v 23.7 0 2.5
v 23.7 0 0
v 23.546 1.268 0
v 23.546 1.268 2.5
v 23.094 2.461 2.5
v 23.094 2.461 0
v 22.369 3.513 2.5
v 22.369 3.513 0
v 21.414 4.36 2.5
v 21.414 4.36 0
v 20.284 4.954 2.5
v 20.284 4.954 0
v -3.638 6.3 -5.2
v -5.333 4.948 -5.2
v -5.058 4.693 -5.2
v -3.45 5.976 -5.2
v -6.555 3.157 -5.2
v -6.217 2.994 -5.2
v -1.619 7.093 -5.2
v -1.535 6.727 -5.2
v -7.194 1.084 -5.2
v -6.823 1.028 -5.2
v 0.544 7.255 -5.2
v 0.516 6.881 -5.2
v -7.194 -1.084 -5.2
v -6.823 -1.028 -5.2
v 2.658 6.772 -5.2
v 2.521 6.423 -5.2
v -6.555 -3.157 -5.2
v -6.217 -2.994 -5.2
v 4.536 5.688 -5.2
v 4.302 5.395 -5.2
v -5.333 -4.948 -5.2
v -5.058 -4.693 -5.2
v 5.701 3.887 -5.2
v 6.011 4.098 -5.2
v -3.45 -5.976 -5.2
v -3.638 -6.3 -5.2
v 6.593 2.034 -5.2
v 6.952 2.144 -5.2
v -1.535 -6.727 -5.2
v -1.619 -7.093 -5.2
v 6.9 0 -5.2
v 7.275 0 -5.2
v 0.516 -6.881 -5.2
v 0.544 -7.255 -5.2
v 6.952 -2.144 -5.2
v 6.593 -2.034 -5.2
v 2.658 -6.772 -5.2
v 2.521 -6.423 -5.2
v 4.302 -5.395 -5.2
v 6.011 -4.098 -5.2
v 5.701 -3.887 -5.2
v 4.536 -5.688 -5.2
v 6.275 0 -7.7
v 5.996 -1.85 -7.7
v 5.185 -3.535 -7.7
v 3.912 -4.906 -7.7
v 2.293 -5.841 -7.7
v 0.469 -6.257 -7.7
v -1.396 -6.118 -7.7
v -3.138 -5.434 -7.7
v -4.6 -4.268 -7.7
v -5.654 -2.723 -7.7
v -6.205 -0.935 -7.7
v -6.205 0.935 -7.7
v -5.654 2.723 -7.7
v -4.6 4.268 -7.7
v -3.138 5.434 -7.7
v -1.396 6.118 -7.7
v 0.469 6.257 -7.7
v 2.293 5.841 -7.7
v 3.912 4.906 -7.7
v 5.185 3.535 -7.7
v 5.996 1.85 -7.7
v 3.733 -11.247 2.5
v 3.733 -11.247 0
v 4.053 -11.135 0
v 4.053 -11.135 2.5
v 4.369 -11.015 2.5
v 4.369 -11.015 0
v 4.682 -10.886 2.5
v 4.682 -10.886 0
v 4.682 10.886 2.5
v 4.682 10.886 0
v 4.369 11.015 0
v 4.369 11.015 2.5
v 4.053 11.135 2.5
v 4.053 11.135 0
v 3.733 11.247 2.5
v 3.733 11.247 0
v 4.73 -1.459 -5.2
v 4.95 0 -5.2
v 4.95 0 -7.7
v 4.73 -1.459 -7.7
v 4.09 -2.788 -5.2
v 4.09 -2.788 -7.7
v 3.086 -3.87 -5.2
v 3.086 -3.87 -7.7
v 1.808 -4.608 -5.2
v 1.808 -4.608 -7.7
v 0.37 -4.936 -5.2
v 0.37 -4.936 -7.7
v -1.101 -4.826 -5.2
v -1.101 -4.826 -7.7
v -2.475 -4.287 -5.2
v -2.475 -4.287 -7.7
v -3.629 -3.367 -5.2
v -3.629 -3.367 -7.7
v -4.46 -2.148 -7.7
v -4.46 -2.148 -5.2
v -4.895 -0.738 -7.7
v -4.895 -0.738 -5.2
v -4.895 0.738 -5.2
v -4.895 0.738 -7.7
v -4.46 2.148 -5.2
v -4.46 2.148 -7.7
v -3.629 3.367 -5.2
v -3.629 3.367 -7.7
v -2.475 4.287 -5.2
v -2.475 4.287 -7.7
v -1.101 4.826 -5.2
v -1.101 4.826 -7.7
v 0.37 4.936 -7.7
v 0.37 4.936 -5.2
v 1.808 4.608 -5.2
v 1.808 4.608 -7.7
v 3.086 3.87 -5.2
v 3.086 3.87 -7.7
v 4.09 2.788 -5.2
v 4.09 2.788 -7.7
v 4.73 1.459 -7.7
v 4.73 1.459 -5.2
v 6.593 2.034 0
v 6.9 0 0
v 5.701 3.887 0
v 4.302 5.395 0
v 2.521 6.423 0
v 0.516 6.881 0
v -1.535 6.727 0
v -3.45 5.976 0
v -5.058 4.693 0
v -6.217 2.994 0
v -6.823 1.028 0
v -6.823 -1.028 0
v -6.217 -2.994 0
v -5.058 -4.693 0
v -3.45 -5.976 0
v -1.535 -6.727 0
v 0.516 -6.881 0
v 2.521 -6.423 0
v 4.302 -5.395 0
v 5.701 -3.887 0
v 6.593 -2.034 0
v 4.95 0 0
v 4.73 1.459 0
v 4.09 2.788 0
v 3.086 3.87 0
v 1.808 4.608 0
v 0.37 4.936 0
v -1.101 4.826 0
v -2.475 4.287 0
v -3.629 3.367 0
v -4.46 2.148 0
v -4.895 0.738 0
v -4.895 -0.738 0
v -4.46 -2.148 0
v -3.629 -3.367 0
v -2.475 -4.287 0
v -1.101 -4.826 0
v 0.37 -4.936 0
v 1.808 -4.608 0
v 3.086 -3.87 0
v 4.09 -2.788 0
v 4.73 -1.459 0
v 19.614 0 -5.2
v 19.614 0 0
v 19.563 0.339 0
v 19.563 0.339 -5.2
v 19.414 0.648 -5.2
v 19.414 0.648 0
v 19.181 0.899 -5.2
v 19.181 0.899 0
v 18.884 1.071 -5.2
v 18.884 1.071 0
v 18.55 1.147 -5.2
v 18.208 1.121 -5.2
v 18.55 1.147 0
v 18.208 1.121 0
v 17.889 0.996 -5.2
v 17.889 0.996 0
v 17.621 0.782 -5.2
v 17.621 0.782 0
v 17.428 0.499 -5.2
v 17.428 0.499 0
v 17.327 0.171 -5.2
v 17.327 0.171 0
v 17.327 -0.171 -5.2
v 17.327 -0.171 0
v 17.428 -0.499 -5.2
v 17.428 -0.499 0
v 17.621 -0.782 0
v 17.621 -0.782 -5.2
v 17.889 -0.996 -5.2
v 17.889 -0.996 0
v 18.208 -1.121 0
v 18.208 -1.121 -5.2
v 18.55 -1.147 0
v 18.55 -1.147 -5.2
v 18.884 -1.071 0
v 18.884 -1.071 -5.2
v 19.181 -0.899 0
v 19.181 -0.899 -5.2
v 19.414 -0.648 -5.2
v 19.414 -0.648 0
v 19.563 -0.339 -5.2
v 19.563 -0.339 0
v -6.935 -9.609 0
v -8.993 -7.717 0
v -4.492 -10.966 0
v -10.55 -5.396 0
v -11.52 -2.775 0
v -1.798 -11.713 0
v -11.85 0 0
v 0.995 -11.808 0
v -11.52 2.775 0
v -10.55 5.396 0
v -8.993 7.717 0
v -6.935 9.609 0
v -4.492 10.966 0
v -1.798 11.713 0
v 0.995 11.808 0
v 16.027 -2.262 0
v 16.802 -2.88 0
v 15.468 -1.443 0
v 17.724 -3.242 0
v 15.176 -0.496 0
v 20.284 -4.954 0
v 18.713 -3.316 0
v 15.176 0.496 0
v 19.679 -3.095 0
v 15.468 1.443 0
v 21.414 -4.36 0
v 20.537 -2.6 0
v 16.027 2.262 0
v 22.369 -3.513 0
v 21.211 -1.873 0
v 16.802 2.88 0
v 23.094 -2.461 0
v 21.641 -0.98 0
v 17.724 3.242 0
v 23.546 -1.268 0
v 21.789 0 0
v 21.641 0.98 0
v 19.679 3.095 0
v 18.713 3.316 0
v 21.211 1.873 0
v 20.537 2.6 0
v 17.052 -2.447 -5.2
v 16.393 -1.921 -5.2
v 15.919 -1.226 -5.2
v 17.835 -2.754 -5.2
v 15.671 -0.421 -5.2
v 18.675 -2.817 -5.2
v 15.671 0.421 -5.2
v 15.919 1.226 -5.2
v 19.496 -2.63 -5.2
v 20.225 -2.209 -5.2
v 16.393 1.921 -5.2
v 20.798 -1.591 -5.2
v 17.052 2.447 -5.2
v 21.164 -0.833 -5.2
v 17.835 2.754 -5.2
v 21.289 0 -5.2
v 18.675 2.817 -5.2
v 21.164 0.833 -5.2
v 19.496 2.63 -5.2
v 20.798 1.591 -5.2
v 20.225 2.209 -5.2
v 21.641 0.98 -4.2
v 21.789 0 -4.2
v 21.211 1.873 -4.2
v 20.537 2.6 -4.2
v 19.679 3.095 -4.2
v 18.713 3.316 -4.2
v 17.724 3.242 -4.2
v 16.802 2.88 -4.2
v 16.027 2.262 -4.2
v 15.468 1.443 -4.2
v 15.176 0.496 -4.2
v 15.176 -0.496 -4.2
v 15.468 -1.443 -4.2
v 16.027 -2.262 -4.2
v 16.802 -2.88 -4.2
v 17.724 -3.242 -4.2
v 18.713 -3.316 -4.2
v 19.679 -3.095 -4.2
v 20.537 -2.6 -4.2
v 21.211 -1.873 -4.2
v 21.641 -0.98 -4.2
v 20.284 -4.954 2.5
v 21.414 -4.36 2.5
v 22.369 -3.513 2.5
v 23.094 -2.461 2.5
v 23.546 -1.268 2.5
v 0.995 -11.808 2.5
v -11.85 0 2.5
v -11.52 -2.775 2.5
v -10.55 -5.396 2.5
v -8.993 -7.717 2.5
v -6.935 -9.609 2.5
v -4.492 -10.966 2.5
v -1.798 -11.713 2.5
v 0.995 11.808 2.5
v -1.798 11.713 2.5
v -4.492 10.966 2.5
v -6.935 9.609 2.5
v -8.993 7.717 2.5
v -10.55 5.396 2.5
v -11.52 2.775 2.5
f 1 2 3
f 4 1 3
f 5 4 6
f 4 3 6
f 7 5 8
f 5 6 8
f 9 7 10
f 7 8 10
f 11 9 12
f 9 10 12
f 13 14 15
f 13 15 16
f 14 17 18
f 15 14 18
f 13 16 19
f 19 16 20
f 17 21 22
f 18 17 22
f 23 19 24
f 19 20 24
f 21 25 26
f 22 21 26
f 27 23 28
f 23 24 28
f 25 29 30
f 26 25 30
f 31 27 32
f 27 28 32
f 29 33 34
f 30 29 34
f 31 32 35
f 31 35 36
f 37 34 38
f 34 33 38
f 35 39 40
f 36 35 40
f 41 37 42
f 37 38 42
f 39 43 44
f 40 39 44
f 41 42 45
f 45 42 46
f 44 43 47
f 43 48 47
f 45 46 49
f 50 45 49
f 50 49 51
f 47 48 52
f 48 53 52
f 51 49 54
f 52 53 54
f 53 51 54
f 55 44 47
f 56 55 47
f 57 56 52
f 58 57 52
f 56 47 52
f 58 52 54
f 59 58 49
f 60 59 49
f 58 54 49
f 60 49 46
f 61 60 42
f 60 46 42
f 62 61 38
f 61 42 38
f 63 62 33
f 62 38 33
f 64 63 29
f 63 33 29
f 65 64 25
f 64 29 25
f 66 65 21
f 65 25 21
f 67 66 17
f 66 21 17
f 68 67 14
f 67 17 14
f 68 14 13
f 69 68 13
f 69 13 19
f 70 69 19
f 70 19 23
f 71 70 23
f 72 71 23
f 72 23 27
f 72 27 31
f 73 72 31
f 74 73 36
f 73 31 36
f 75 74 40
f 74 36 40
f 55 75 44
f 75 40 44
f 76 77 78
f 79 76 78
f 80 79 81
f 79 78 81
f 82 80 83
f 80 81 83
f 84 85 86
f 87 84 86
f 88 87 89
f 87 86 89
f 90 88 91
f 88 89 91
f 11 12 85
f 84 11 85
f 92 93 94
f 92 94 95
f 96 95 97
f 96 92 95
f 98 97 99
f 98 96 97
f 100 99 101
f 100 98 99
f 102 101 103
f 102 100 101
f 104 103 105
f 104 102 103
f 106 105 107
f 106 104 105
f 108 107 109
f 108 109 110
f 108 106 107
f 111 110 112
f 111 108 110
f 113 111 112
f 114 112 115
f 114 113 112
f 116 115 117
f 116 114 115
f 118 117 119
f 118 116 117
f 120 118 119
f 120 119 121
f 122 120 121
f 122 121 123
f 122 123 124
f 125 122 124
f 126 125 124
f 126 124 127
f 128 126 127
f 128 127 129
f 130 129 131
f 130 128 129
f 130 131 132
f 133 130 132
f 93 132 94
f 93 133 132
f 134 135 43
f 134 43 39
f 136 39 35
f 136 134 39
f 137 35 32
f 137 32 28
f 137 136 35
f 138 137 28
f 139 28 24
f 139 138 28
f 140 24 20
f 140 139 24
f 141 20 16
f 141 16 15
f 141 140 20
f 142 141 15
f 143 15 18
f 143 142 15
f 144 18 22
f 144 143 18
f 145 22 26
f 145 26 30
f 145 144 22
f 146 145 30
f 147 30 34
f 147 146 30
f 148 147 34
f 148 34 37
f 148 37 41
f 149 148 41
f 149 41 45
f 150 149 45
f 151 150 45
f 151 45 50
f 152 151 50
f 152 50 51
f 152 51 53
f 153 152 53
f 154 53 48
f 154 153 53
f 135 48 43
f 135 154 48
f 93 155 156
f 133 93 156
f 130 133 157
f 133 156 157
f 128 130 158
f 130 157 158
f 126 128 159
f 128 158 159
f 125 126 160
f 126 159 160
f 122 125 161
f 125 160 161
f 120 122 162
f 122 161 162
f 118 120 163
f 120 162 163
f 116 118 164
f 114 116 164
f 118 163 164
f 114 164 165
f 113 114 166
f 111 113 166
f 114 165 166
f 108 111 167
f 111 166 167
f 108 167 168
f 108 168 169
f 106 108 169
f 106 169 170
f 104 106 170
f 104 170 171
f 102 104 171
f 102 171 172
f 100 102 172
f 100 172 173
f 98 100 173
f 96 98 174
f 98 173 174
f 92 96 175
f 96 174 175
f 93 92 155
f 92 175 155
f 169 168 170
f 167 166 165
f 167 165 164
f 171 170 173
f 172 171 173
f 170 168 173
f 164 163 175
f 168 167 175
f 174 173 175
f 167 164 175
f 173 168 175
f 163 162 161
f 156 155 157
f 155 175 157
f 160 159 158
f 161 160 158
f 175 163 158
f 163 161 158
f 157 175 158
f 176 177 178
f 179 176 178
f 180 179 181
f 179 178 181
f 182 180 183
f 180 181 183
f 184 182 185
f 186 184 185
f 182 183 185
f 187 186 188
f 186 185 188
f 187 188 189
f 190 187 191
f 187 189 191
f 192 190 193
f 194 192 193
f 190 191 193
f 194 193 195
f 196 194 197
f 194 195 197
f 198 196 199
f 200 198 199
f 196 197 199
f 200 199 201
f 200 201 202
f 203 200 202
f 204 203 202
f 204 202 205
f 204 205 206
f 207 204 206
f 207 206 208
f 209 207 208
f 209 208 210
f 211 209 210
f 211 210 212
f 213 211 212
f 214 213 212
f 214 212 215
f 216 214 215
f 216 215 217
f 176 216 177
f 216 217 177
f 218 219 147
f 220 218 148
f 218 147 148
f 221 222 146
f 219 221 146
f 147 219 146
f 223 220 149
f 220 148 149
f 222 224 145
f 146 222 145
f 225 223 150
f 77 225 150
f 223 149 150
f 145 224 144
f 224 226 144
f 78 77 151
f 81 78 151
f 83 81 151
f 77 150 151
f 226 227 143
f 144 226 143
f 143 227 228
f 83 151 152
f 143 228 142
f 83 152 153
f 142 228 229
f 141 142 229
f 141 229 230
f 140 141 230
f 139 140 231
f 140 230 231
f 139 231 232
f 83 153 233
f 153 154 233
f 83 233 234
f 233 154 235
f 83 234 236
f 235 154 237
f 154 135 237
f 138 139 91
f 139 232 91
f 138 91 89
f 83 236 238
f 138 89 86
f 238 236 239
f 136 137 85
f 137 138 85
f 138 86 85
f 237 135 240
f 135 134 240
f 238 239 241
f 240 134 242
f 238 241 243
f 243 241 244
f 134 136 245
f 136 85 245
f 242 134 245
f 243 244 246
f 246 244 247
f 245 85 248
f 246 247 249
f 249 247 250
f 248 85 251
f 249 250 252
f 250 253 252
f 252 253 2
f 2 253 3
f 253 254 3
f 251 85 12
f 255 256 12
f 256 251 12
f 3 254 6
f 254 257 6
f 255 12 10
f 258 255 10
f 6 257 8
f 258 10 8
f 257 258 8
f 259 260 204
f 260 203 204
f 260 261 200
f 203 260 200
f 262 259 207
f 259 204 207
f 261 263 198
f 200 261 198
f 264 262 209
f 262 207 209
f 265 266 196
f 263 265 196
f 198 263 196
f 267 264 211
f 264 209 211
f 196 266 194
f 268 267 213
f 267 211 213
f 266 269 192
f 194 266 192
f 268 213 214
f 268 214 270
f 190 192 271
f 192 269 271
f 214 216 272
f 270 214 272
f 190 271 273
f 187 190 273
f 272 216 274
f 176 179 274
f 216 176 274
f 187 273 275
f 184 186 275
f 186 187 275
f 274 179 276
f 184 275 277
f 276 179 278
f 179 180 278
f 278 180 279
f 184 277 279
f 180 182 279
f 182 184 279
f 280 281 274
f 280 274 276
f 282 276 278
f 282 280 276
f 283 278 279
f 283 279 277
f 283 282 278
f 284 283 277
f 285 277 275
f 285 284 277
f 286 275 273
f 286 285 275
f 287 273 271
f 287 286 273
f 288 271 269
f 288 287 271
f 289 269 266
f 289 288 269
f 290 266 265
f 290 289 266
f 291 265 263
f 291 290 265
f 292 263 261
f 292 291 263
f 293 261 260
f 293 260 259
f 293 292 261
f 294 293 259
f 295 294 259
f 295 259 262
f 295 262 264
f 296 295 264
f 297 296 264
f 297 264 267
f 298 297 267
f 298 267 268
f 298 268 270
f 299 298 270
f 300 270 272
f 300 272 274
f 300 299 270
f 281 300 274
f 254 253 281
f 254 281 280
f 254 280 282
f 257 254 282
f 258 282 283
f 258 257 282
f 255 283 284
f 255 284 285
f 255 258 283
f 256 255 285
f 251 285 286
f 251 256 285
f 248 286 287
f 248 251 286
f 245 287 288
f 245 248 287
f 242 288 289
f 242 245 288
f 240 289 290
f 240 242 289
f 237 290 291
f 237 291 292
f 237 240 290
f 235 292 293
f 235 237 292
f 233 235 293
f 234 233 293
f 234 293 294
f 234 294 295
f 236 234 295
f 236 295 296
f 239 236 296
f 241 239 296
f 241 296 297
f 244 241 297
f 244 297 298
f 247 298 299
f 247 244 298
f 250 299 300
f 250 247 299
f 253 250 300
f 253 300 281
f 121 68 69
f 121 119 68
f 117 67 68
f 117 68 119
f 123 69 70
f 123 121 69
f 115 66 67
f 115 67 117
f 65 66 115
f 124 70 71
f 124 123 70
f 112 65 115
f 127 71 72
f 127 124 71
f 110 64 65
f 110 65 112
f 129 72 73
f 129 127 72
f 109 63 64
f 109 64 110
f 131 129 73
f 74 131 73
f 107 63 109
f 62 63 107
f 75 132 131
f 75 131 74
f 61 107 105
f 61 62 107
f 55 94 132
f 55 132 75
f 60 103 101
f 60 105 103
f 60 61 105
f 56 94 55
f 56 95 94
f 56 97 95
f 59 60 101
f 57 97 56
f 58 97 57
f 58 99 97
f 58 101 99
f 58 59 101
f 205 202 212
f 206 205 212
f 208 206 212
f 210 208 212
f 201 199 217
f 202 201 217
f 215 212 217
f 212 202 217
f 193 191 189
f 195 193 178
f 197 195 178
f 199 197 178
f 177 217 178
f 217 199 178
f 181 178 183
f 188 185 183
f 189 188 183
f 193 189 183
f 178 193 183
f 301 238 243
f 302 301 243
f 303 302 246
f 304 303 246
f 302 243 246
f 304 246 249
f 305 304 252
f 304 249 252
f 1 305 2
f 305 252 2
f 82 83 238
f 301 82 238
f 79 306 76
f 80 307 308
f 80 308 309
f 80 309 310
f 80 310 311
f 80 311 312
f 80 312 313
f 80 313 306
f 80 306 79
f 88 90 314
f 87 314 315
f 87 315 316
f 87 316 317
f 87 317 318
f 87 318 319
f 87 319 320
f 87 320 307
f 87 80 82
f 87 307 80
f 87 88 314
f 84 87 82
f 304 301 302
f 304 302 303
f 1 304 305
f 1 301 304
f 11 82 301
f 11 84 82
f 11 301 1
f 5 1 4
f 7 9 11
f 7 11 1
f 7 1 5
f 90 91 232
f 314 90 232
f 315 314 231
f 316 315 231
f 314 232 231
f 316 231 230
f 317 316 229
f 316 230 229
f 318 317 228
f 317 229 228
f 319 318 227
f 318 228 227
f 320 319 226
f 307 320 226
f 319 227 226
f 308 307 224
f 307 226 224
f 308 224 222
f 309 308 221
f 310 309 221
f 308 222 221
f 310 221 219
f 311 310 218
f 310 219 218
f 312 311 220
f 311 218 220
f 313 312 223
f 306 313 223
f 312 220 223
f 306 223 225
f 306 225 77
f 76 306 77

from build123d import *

# Parameters (mm, degrees)
F1_DEPTH = 2.5
F2_R     = 6.9
F2_R_2   = 4.95
F2_R_3   = 3.325
F2_R_4   = 1.15
F3_DEPTH = 5.2
F4_R     = 7.275
F4_R_2   = 4.95
F5_DEPTH = 2.5
F6_SIZE2 = 2.49999
F6_SIZE  = 0.99999
F7_SIZE2 = 1
F7_SIZE  = 0.5


# Not quite as in the source:
# - a fillet or chamfer is up to 0.001 mm smaller than in the source, because OpenCascade refuses the exact size


with BuildPart() as f1:
    # F0 (on Top) → F1 (new body)
    with BuildSketch(Plane.XY):
        with BuildLine():
            Line((4.6819136376, 10.8858708742), (3.7330328633, 11.2466424164))
            ThreePointArc((3.7330328633, 11.2466424164), (-11.85, 0), (3.7330328633, -11.2466424164))
            Line((3.7330328633, -11.2466424164), (4.6819136376, -10.8858708742))
            ThreePointArc((4.6819136376, -10.8858708742), (9.8970494746, -6.5169710523), (11.85, 0))
            ThreePointArc((11.85, 0), (9.8970494746, 6.5169710523), (4.6819136376, 10.8858708742))
        make_face()
        with BuildLine():
            ThreePointArc((4.6819136376, 10.8858708742), (4.2113382884, 11.0764222482), (3.7330328633, 11.2466424164))
            Line((3.7330328633, 11.2466424164), (4.6819136376, 10.8858708742))
        make_face()
        with BuildLine():
            Line((4.6819136376, -10.8858708742), (3.7330328633, -11.2466424164))
            ThreePointArc((3.7330328633, -11.2466424164), (4.2113382884, -11.0764222482), (4.6819136376, -10.8858708742))
        make_face()
        with BuildLine():
            Line((20.2835521459, 4.9540116384), (4.6819136376, 10.8858708742))
            ThreePointArc((4.6819136376, 10.8858708742), (9.8970494746, 6.5169710523), (11.85, 0))
            ThreePointArc((11.85, 0), (9.8970494746, -6.5169710523), (4.6819136376, -10.8858708742))
            Line((4.6819136376, -10.8858708742), (20.2835521459, -4.9540116384))
            ThreePointArc((20.2835521459, -4.9540116384), (13.1, 0), (20.2835521459, 4.9540116384))
        make_face()
        with BuildLine():
            ThreePointArc((23.7, 0), (22.7630738232, 3.0089178808), (20.2835521459, 4.9540116384))
            ThreePointArc((20.2835521459, 4.9540116384), (13.1, 0), (20.2835521459, -4.9540116384))
            ThreePointArc((20.2835521459, -4.9540116384), (22.7630738232, -3.0089178808), (23.7, 0))
        make_face()
    extrude(amount=F1_DEPTH)

    # F2 (on Top) → F3 (join)
    with BuildSketch(Plane.XY):
        Circle(F2_R)
        Circle(F2_R_2, mode=Mode.SUBTRACT)
        with Locations((18.464056775, 0)):
            Circle(F2_R_3)
        with Locations((18.464056775, 0)):
            Circle(F2_R_4, mode=Mode.SUBTRACT)
    extrude(amount=-F3_DEPTH)

    # F4 (on face) → F5 (join)
    with BuildSketch(Plane(origin=(0, 0, -5.2), x_dir=(1, 0, 0), z_dir=(0, 0, -1))):
        Circle(F4_R)
        Circle(F4_R_2, mode=Mode.SUBTRACT)
    extrude(amount=F5_DEPTH)

    # F6 (size 1 and 2.5 in the source; OpenCascade refuses exactly that, so slightly less here)
    f6_edges = [f1.edges().sort_by_distance(p)[0] for p in [
        (-7.275, 0, -7.7),
    ]]
    f6_side = f1.faces().sort_by_distance((-7.069232, 0, -7.7))[0]
    chamfer(f6_edges, length=F6_SIZE, length2=F6_SIZE2, reference=f6_side)

    # F7
    f7_edges = [f1.edges().sort_by_distance(p)[0] for p in [
        (15.139057, 0, -5.2),
    ]]
    f7_side = f1.faces().sort_by_distance((15.233102, 0, -5.2))[0]
    chamfer(f7_edges, length=F7_SIZE, length2=F7_SIZE2, reference=f7_side)


solid = f1.part
